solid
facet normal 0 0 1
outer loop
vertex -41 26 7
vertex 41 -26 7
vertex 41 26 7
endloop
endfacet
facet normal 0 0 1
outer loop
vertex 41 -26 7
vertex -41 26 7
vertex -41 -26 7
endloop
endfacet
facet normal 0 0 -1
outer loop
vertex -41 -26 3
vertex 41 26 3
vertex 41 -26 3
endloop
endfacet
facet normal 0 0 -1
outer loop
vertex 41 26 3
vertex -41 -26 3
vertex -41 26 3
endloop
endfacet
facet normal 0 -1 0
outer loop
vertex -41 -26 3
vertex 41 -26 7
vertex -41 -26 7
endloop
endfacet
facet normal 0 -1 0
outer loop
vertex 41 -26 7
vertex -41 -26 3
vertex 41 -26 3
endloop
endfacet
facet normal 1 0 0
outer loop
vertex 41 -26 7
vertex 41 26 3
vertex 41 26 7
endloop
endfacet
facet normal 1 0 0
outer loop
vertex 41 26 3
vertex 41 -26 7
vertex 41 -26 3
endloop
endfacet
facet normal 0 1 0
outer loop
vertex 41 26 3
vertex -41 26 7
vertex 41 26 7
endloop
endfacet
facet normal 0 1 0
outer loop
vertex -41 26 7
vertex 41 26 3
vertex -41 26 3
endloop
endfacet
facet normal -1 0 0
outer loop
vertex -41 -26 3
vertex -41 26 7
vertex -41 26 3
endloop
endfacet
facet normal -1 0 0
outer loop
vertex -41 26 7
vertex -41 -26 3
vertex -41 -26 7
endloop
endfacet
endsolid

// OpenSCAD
// Generated with SolidPython2 for OpenSCAD task-016
$fn = 64;

union() {
	translate(v = [-41.0, -26.0, 3]) {
		cube(size = [82, 52, 4]);
	}
}
